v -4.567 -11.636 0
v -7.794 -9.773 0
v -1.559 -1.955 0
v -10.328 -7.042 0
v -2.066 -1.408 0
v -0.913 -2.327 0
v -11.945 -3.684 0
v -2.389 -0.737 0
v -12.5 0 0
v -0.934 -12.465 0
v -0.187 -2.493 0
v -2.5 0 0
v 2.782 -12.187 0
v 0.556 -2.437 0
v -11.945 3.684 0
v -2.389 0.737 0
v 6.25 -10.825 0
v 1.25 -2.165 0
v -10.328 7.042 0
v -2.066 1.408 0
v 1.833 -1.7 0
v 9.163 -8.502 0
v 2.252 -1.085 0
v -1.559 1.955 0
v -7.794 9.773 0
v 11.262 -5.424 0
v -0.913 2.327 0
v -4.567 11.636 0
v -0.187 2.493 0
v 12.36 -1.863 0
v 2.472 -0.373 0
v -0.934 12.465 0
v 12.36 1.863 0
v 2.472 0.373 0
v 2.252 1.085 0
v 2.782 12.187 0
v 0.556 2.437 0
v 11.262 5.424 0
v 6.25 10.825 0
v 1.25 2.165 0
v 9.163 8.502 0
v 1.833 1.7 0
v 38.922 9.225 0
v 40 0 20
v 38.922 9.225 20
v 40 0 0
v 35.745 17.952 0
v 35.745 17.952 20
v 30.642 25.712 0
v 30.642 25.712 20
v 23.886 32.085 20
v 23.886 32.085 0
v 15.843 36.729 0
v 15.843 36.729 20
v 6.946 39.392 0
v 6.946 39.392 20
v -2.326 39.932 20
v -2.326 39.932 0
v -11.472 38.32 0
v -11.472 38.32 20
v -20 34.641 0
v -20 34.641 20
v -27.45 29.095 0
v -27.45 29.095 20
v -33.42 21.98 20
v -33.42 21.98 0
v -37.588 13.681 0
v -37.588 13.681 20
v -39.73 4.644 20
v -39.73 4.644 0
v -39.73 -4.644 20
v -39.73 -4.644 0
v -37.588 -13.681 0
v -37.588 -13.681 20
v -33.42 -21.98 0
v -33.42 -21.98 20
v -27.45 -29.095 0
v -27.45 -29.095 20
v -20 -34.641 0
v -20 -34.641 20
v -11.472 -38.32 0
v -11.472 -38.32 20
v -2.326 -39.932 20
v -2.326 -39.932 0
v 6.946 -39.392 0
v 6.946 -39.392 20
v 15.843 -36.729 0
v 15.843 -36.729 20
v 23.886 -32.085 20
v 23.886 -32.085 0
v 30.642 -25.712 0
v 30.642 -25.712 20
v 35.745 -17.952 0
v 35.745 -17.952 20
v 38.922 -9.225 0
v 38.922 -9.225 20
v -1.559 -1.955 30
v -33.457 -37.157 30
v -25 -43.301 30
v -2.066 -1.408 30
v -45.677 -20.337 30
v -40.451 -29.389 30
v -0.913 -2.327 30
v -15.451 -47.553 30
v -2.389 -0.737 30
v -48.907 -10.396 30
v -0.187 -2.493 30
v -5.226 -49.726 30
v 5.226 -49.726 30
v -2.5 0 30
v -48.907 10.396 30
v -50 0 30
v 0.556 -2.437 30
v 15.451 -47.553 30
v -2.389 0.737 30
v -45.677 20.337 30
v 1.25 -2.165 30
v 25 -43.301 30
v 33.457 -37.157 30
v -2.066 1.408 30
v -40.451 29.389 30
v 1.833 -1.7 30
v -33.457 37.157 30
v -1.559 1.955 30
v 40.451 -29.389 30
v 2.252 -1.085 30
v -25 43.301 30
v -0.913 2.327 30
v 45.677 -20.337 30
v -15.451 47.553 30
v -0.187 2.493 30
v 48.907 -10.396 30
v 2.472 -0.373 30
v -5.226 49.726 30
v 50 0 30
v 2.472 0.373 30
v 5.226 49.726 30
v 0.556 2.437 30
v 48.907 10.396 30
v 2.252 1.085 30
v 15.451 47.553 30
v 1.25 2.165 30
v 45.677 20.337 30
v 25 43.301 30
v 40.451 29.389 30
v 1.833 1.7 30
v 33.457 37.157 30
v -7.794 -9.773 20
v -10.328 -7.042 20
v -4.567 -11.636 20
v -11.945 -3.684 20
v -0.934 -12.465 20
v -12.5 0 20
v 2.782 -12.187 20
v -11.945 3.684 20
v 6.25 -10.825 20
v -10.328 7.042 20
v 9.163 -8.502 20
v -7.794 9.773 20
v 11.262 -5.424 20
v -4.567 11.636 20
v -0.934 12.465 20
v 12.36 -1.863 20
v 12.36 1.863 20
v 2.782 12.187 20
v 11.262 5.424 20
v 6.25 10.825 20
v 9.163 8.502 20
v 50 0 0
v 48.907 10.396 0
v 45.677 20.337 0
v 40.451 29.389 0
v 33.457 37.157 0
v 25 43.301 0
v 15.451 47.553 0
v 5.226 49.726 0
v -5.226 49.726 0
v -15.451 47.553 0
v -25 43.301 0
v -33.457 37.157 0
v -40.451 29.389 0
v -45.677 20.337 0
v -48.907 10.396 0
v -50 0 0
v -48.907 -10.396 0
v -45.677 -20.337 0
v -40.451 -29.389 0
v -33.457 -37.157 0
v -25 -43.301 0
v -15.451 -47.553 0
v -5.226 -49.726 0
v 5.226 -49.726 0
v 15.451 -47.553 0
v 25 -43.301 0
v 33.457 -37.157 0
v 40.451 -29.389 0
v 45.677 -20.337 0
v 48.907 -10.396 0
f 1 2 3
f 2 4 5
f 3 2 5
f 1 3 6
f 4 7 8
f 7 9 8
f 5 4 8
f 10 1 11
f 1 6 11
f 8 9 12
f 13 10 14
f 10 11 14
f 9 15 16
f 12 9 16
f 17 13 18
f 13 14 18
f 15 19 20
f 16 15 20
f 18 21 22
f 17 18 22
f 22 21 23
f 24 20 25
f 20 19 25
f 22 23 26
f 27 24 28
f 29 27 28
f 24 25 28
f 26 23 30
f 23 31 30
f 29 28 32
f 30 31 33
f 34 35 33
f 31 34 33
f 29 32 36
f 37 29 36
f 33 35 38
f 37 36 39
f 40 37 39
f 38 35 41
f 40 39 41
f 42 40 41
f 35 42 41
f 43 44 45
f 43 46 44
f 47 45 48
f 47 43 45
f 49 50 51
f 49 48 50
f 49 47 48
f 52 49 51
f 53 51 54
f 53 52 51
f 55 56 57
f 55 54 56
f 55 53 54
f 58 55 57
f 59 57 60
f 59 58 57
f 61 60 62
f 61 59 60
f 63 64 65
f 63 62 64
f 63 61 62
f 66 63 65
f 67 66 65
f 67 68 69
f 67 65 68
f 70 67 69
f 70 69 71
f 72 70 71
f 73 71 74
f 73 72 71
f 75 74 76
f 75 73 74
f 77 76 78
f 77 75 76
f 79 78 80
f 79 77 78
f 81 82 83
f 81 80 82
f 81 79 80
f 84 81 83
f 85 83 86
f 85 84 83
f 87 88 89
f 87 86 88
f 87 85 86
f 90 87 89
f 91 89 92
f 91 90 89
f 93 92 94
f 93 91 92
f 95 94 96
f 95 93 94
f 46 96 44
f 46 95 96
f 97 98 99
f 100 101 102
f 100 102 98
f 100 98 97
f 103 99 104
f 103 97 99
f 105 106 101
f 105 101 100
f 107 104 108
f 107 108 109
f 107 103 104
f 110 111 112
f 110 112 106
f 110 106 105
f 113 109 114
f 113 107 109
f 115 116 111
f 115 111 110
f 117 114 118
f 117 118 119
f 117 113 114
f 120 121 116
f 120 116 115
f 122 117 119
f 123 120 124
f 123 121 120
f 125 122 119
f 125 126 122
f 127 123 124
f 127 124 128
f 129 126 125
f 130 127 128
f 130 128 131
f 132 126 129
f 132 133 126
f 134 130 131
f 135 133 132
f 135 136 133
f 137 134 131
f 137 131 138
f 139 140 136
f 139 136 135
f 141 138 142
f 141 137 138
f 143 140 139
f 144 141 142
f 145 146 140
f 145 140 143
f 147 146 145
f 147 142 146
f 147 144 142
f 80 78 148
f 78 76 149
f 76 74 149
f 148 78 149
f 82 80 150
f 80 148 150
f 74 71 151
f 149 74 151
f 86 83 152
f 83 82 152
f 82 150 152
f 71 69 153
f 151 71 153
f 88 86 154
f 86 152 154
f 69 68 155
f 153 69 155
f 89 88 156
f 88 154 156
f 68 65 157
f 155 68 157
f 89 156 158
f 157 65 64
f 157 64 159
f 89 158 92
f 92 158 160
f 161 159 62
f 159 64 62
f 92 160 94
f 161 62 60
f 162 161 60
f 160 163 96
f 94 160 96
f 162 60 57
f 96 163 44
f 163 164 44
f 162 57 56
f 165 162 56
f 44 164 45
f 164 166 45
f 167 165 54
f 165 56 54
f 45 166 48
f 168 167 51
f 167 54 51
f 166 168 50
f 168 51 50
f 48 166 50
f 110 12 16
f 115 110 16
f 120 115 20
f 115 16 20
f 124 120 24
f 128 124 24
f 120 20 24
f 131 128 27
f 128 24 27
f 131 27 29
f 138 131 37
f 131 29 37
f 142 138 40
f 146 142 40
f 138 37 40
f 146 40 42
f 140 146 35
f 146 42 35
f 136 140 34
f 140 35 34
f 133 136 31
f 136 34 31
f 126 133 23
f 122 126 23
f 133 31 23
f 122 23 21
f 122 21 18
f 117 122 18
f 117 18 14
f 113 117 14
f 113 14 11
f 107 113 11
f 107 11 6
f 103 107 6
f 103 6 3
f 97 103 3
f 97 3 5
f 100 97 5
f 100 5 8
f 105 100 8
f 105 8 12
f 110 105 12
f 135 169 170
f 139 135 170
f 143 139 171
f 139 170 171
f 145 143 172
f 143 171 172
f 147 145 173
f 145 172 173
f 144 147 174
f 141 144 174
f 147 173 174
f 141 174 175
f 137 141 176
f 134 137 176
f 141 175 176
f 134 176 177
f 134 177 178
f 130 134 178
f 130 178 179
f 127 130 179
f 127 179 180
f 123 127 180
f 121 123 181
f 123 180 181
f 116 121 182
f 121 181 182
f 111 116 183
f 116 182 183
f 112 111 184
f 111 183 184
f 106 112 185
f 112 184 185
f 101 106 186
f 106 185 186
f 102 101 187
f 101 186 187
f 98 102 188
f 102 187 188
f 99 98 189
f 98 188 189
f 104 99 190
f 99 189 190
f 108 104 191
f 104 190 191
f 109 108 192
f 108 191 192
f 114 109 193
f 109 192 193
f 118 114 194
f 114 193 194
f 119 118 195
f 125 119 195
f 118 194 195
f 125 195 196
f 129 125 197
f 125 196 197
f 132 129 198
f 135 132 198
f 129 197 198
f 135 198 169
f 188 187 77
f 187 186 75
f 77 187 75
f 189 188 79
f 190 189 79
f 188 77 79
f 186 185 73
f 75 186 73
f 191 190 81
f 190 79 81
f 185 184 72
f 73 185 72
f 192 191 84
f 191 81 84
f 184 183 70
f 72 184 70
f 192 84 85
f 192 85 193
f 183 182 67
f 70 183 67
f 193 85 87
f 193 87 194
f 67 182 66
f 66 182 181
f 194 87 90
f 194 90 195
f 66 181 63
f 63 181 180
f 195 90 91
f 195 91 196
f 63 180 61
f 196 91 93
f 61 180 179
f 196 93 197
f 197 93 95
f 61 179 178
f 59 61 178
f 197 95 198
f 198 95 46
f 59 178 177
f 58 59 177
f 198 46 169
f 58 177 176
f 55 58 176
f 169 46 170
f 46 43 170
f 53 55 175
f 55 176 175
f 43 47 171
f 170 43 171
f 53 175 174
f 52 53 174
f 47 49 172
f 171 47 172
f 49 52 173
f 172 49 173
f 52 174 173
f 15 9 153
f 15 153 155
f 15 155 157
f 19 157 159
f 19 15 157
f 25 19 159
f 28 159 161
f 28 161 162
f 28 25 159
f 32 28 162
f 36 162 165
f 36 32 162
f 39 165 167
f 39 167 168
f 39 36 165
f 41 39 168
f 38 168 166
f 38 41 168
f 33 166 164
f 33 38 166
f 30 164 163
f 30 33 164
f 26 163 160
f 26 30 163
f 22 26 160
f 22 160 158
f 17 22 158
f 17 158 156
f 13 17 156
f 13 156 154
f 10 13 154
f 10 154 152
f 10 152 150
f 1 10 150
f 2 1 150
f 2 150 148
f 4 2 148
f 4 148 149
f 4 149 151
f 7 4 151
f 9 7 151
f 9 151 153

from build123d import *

# Parameters (mm, degrees)
SKETCH1_R           = 50
BOSS_EXTRUDE1_DEPTH = 30
SKETCH2_R           = 2.5
CUT_EXTRUDE1_DEPTH  = 31
SHELL1_T            = -10


with BuildPart() as part:
    # Sketch1 → Boss-Extrude1 (new body)
    with BuildSketch(Plane.XY):
        Circle(SKETCH1_R)
    extrude(amount=BOSS_EXTRUDE1_DEPTH)

    # Sketch2 → Cut-Extrude1 (cut, through all)
    with BuildSketch(Plane(origin=(0, 0, 0), x_dir=(-1, 0, 0), z_dir=(0, 0, -1))):
        Circle(SKETCH2_R)
    extrude(amount=-CUT_EXTRUDE1_DEPTH, mode=Mode.SUBTRACT)

    # Shell1
    shell1_openings = [part.faces().sort_by_distance(p)[0] for p in [
        (-2.5, 0, 0),
    ]]
    offset(amount=SHELL1_T, openings=shell1_openings, kind=Kind.INTERSECTION)


solid = part.part
